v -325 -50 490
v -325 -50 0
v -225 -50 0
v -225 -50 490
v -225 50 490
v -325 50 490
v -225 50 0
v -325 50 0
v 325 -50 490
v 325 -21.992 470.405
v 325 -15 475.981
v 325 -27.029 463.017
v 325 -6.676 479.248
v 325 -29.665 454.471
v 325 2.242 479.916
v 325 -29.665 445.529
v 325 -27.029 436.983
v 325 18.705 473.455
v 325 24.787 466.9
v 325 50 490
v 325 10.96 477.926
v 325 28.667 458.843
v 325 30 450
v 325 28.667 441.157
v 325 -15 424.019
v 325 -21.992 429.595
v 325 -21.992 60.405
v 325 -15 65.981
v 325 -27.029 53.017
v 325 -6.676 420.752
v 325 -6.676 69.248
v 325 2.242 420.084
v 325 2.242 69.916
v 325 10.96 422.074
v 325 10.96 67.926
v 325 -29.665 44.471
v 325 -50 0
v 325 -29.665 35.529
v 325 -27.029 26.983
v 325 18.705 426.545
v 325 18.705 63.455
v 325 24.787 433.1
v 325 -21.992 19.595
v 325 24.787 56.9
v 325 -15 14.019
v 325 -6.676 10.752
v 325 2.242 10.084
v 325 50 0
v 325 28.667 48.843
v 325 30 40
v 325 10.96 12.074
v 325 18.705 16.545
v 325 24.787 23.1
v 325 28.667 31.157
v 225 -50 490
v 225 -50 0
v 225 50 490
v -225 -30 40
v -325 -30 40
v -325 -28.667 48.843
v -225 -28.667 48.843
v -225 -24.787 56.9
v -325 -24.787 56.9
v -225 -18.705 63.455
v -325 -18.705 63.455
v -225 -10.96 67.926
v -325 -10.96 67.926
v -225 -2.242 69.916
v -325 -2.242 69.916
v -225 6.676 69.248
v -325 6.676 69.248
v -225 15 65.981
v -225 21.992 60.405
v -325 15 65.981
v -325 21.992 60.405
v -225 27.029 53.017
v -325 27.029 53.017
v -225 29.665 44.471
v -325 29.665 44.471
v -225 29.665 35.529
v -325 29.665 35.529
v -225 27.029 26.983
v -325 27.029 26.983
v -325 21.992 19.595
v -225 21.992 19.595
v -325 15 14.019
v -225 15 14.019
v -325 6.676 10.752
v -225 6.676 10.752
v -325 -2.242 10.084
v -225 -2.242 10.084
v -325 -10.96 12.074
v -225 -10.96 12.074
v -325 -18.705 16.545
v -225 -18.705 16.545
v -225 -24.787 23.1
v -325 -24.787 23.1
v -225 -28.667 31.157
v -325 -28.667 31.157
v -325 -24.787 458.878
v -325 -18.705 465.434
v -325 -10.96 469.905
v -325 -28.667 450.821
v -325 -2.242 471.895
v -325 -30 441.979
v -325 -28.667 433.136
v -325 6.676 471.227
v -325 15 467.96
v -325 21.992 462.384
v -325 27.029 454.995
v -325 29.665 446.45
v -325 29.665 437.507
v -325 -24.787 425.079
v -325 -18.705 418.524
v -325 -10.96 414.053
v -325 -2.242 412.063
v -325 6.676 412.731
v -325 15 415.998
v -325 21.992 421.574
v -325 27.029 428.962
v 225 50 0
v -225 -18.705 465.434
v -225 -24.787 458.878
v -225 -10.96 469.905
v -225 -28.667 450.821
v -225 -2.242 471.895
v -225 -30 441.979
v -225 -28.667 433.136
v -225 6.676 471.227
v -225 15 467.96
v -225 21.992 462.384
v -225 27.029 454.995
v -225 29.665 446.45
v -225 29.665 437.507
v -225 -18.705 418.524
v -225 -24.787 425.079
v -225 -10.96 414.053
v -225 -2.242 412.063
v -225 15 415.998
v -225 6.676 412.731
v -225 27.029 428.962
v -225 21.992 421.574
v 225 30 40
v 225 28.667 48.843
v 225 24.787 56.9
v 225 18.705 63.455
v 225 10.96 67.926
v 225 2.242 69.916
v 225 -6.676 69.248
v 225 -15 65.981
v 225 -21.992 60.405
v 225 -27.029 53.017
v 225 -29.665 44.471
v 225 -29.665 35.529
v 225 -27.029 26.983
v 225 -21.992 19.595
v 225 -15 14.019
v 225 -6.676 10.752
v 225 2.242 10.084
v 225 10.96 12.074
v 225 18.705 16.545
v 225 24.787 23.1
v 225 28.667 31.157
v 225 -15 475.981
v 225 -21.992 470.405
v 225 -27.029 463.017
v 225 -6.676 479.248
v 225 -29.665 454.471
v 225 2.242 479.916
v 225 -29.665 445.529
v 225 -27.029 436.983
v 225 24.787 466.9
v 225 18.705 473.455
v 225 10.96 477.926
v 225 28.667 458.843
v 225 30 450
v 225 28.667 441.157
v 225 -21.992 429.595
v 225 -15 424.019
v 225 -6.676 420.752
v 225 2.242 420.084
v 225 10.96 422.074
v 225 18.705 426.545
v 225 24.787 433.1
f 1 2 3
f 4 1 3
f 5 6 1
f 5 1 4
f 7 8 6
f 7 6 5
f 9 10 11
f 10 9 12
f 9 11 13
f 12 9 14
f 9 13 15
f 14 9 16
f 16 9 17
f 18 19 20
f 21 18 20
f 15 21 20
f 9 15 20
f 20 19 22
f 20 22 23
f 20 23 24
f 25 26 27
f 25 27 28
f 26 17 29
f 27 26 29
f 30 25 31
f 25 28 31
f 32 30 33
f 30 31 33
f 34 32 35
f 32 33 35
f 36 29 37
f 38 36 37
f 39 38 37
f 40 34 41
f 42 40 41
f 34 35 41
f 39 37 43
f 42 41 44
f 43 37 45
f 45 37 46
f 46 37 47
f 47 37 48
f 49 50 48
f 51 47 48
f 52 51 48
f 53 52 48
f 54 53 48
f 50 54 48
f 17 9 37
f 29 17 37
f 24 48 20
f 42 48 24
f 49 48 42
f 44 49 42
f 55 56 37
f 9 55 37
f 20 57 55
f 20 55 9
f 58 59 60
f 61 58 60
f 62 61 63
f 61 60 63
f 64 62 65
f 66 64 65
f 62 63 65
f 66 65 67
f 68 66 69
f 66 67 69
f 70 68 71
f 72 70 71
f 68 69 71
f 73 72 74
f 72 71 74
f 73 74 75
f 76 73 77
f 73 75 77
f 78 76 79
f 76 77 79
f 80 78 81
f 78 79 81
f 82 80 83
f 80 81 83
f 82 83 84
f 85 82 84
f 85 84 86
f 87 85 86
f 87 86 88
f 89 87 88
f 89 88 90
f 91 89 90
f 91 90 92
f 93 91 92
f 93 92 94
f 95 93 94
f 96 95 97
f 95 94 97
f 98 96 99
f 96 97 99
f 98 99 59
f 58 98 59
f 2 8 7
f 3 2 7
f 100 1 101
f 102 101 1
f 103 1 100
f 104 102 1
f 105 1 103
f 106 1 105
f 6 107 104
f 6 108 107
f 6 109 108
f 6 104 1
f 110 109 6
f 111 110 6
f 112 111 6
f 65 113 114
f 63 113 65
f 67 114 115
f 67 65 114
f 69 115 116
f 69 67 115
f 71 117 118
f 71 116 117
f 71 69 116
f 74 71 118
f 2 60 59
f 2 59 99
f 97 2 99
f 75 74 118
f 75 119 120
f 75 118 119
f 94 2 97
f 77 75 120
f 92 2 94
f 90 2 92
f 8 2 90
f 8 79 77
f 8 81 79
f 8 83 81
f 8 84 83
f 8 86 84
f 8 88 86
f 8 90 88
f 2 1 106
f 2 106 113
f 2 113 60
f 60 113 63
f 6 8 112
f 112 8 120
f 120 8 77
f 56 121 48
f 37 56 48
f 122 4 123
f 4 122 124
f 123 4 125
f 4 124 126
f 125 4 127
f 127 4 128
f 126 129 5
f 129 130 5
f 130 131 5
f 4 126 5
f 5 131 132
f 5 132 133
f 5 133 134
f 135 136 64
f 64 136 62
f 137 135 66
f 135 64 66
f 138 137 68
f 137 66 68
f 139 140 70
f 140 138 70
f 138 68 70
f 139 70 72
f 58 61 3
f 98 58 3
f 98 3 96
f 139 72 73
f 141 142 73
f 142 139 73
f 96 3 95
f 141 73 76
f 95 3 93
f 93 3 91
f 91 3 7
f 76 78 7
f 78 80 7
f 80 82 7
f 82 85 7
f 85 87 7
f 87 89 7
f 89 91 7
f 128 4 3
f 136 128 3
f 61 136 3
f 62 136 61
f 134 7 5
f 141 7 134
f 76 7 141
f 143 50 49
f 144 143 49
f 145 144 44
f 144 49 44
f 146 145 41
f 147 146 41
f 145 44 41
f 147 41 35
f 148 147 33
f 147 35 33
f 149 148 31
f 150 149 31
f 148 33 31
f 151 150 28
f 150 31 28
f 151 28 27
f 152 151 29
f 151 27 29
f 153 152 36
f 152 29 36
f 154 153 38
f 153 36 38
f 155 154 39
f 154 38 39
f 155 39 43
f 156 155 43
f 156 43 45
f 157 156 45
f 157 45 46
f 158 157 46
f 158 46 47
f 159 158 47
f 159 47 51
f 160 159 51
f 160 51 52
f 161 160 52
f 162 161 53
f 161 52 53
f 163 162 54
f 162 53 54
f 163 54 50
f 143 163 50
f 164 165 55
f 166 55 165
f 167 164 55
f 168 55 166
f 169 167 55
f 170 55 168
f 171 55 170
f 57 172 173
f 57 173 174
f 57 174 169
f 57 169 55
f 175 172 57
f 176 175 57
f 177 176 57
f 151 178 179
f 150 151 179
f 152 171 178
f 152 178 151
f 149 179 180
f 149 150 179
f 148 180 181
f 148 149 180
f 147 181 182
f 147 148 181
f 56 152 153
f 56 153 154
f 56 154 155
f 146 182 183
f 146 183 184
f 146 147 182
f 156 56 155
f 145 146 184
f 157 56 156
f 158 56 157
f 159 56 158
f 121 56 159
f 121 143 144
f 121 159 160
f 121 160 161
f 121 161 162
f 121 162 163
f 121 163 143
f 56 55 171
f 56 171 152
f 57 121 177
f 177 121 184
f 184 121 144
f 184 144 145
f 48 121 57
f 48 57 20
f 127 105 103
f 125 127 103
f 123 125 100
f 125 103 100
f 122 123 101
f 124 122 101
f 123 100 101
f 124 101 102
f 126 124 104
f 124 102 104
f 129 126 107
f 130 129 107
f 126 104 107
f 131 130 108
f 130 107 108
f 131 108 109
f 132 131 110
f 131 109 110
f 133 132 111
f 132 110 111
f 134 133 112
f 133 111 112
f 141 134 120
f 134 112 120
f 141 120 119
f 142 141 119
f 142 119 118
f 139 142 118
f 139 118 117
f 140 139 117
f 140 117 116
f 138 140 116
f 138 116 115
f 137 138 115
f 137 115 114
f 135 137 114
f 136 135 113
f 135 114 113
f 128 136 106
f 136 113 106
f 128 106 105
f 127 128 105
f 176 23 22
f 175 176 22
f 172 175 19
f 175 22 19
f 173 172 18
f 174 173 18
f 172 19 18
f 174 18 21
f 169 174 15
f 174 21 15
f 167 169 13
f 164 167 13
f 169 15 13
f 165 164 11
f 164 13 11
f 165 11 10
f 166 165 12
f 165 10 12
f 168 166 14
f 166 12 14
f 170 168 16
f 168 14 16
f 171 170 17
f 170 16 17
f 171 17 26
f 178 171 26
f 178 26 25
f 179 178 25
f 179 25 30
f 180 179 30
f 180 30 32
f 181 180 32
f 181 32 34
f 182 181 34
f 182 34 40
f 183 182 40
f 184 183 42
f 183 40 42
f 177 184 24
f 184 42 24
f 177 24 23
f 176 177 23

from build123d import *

# Parameters (mm, degrees)
F0_W     = 100
F0_H     = 100
F1_DEPTH = 490
F2_R     = 30
F4_DEPTH = 100
F3_R     = 30
F5_DEPTH = 100
F6_R     = 30
F7_DEPTH = 100
F8_R     = 30
F9_DEPTH = 100


with BuildPart() as f1:
    # F0 (on Top) → F1 (new body)
    with BuildSketch(Plane.XY):
        with Locations((-275, 0)):
            Rectangle(F0_W, F0_H)
        with Locations((275, 0)):
            Rectangle(F0_W, F0_H)
    extrude(amount=F1_DEPTH)

    # F2 (on face) → F4 (cut)
    with BuildSketch(Plane(origin=(-325, 0, 0), x_dir=(0, -1, 0), z_dir=(-1, 0, 0))):
        with Locations((0, 441.978755)):
            Circle(F2_R)
    extrude(amount=-F4_DEPTH, mode=Mode.SUBTRACT)

    # F3 (on face) → F5 (cut)
    with BuildSketch(Plane.YZ.offset(325)):
        with Locations((0, 450)):
            Circle(F3_R)
    extrude(amount=-F5_DEPTH, mode=Mode.SUBTRACT)

    # F6 (on face) → F7 (cut)
    with BuildSketch(Plane.YZ.offset(325)):
        with Locations((0, 40)):
            Circle(F6_R)
    extrude(amount=-F7_DEPTH, mode=Mode.SUBTRACT)

    # F8 (on face) → F9 (cut)
    with BuildSketch(Plane(origin=(-325, 0, 0), x_dir=(0, -1, 0), z_dir=(-1, 0, 0))):
        with Locations((0, 40)):
            Circle(F8_R)
    extrude(amount=-F9_DEPTH, mode=Mode.SUBTRACT)


solid = f1.part
